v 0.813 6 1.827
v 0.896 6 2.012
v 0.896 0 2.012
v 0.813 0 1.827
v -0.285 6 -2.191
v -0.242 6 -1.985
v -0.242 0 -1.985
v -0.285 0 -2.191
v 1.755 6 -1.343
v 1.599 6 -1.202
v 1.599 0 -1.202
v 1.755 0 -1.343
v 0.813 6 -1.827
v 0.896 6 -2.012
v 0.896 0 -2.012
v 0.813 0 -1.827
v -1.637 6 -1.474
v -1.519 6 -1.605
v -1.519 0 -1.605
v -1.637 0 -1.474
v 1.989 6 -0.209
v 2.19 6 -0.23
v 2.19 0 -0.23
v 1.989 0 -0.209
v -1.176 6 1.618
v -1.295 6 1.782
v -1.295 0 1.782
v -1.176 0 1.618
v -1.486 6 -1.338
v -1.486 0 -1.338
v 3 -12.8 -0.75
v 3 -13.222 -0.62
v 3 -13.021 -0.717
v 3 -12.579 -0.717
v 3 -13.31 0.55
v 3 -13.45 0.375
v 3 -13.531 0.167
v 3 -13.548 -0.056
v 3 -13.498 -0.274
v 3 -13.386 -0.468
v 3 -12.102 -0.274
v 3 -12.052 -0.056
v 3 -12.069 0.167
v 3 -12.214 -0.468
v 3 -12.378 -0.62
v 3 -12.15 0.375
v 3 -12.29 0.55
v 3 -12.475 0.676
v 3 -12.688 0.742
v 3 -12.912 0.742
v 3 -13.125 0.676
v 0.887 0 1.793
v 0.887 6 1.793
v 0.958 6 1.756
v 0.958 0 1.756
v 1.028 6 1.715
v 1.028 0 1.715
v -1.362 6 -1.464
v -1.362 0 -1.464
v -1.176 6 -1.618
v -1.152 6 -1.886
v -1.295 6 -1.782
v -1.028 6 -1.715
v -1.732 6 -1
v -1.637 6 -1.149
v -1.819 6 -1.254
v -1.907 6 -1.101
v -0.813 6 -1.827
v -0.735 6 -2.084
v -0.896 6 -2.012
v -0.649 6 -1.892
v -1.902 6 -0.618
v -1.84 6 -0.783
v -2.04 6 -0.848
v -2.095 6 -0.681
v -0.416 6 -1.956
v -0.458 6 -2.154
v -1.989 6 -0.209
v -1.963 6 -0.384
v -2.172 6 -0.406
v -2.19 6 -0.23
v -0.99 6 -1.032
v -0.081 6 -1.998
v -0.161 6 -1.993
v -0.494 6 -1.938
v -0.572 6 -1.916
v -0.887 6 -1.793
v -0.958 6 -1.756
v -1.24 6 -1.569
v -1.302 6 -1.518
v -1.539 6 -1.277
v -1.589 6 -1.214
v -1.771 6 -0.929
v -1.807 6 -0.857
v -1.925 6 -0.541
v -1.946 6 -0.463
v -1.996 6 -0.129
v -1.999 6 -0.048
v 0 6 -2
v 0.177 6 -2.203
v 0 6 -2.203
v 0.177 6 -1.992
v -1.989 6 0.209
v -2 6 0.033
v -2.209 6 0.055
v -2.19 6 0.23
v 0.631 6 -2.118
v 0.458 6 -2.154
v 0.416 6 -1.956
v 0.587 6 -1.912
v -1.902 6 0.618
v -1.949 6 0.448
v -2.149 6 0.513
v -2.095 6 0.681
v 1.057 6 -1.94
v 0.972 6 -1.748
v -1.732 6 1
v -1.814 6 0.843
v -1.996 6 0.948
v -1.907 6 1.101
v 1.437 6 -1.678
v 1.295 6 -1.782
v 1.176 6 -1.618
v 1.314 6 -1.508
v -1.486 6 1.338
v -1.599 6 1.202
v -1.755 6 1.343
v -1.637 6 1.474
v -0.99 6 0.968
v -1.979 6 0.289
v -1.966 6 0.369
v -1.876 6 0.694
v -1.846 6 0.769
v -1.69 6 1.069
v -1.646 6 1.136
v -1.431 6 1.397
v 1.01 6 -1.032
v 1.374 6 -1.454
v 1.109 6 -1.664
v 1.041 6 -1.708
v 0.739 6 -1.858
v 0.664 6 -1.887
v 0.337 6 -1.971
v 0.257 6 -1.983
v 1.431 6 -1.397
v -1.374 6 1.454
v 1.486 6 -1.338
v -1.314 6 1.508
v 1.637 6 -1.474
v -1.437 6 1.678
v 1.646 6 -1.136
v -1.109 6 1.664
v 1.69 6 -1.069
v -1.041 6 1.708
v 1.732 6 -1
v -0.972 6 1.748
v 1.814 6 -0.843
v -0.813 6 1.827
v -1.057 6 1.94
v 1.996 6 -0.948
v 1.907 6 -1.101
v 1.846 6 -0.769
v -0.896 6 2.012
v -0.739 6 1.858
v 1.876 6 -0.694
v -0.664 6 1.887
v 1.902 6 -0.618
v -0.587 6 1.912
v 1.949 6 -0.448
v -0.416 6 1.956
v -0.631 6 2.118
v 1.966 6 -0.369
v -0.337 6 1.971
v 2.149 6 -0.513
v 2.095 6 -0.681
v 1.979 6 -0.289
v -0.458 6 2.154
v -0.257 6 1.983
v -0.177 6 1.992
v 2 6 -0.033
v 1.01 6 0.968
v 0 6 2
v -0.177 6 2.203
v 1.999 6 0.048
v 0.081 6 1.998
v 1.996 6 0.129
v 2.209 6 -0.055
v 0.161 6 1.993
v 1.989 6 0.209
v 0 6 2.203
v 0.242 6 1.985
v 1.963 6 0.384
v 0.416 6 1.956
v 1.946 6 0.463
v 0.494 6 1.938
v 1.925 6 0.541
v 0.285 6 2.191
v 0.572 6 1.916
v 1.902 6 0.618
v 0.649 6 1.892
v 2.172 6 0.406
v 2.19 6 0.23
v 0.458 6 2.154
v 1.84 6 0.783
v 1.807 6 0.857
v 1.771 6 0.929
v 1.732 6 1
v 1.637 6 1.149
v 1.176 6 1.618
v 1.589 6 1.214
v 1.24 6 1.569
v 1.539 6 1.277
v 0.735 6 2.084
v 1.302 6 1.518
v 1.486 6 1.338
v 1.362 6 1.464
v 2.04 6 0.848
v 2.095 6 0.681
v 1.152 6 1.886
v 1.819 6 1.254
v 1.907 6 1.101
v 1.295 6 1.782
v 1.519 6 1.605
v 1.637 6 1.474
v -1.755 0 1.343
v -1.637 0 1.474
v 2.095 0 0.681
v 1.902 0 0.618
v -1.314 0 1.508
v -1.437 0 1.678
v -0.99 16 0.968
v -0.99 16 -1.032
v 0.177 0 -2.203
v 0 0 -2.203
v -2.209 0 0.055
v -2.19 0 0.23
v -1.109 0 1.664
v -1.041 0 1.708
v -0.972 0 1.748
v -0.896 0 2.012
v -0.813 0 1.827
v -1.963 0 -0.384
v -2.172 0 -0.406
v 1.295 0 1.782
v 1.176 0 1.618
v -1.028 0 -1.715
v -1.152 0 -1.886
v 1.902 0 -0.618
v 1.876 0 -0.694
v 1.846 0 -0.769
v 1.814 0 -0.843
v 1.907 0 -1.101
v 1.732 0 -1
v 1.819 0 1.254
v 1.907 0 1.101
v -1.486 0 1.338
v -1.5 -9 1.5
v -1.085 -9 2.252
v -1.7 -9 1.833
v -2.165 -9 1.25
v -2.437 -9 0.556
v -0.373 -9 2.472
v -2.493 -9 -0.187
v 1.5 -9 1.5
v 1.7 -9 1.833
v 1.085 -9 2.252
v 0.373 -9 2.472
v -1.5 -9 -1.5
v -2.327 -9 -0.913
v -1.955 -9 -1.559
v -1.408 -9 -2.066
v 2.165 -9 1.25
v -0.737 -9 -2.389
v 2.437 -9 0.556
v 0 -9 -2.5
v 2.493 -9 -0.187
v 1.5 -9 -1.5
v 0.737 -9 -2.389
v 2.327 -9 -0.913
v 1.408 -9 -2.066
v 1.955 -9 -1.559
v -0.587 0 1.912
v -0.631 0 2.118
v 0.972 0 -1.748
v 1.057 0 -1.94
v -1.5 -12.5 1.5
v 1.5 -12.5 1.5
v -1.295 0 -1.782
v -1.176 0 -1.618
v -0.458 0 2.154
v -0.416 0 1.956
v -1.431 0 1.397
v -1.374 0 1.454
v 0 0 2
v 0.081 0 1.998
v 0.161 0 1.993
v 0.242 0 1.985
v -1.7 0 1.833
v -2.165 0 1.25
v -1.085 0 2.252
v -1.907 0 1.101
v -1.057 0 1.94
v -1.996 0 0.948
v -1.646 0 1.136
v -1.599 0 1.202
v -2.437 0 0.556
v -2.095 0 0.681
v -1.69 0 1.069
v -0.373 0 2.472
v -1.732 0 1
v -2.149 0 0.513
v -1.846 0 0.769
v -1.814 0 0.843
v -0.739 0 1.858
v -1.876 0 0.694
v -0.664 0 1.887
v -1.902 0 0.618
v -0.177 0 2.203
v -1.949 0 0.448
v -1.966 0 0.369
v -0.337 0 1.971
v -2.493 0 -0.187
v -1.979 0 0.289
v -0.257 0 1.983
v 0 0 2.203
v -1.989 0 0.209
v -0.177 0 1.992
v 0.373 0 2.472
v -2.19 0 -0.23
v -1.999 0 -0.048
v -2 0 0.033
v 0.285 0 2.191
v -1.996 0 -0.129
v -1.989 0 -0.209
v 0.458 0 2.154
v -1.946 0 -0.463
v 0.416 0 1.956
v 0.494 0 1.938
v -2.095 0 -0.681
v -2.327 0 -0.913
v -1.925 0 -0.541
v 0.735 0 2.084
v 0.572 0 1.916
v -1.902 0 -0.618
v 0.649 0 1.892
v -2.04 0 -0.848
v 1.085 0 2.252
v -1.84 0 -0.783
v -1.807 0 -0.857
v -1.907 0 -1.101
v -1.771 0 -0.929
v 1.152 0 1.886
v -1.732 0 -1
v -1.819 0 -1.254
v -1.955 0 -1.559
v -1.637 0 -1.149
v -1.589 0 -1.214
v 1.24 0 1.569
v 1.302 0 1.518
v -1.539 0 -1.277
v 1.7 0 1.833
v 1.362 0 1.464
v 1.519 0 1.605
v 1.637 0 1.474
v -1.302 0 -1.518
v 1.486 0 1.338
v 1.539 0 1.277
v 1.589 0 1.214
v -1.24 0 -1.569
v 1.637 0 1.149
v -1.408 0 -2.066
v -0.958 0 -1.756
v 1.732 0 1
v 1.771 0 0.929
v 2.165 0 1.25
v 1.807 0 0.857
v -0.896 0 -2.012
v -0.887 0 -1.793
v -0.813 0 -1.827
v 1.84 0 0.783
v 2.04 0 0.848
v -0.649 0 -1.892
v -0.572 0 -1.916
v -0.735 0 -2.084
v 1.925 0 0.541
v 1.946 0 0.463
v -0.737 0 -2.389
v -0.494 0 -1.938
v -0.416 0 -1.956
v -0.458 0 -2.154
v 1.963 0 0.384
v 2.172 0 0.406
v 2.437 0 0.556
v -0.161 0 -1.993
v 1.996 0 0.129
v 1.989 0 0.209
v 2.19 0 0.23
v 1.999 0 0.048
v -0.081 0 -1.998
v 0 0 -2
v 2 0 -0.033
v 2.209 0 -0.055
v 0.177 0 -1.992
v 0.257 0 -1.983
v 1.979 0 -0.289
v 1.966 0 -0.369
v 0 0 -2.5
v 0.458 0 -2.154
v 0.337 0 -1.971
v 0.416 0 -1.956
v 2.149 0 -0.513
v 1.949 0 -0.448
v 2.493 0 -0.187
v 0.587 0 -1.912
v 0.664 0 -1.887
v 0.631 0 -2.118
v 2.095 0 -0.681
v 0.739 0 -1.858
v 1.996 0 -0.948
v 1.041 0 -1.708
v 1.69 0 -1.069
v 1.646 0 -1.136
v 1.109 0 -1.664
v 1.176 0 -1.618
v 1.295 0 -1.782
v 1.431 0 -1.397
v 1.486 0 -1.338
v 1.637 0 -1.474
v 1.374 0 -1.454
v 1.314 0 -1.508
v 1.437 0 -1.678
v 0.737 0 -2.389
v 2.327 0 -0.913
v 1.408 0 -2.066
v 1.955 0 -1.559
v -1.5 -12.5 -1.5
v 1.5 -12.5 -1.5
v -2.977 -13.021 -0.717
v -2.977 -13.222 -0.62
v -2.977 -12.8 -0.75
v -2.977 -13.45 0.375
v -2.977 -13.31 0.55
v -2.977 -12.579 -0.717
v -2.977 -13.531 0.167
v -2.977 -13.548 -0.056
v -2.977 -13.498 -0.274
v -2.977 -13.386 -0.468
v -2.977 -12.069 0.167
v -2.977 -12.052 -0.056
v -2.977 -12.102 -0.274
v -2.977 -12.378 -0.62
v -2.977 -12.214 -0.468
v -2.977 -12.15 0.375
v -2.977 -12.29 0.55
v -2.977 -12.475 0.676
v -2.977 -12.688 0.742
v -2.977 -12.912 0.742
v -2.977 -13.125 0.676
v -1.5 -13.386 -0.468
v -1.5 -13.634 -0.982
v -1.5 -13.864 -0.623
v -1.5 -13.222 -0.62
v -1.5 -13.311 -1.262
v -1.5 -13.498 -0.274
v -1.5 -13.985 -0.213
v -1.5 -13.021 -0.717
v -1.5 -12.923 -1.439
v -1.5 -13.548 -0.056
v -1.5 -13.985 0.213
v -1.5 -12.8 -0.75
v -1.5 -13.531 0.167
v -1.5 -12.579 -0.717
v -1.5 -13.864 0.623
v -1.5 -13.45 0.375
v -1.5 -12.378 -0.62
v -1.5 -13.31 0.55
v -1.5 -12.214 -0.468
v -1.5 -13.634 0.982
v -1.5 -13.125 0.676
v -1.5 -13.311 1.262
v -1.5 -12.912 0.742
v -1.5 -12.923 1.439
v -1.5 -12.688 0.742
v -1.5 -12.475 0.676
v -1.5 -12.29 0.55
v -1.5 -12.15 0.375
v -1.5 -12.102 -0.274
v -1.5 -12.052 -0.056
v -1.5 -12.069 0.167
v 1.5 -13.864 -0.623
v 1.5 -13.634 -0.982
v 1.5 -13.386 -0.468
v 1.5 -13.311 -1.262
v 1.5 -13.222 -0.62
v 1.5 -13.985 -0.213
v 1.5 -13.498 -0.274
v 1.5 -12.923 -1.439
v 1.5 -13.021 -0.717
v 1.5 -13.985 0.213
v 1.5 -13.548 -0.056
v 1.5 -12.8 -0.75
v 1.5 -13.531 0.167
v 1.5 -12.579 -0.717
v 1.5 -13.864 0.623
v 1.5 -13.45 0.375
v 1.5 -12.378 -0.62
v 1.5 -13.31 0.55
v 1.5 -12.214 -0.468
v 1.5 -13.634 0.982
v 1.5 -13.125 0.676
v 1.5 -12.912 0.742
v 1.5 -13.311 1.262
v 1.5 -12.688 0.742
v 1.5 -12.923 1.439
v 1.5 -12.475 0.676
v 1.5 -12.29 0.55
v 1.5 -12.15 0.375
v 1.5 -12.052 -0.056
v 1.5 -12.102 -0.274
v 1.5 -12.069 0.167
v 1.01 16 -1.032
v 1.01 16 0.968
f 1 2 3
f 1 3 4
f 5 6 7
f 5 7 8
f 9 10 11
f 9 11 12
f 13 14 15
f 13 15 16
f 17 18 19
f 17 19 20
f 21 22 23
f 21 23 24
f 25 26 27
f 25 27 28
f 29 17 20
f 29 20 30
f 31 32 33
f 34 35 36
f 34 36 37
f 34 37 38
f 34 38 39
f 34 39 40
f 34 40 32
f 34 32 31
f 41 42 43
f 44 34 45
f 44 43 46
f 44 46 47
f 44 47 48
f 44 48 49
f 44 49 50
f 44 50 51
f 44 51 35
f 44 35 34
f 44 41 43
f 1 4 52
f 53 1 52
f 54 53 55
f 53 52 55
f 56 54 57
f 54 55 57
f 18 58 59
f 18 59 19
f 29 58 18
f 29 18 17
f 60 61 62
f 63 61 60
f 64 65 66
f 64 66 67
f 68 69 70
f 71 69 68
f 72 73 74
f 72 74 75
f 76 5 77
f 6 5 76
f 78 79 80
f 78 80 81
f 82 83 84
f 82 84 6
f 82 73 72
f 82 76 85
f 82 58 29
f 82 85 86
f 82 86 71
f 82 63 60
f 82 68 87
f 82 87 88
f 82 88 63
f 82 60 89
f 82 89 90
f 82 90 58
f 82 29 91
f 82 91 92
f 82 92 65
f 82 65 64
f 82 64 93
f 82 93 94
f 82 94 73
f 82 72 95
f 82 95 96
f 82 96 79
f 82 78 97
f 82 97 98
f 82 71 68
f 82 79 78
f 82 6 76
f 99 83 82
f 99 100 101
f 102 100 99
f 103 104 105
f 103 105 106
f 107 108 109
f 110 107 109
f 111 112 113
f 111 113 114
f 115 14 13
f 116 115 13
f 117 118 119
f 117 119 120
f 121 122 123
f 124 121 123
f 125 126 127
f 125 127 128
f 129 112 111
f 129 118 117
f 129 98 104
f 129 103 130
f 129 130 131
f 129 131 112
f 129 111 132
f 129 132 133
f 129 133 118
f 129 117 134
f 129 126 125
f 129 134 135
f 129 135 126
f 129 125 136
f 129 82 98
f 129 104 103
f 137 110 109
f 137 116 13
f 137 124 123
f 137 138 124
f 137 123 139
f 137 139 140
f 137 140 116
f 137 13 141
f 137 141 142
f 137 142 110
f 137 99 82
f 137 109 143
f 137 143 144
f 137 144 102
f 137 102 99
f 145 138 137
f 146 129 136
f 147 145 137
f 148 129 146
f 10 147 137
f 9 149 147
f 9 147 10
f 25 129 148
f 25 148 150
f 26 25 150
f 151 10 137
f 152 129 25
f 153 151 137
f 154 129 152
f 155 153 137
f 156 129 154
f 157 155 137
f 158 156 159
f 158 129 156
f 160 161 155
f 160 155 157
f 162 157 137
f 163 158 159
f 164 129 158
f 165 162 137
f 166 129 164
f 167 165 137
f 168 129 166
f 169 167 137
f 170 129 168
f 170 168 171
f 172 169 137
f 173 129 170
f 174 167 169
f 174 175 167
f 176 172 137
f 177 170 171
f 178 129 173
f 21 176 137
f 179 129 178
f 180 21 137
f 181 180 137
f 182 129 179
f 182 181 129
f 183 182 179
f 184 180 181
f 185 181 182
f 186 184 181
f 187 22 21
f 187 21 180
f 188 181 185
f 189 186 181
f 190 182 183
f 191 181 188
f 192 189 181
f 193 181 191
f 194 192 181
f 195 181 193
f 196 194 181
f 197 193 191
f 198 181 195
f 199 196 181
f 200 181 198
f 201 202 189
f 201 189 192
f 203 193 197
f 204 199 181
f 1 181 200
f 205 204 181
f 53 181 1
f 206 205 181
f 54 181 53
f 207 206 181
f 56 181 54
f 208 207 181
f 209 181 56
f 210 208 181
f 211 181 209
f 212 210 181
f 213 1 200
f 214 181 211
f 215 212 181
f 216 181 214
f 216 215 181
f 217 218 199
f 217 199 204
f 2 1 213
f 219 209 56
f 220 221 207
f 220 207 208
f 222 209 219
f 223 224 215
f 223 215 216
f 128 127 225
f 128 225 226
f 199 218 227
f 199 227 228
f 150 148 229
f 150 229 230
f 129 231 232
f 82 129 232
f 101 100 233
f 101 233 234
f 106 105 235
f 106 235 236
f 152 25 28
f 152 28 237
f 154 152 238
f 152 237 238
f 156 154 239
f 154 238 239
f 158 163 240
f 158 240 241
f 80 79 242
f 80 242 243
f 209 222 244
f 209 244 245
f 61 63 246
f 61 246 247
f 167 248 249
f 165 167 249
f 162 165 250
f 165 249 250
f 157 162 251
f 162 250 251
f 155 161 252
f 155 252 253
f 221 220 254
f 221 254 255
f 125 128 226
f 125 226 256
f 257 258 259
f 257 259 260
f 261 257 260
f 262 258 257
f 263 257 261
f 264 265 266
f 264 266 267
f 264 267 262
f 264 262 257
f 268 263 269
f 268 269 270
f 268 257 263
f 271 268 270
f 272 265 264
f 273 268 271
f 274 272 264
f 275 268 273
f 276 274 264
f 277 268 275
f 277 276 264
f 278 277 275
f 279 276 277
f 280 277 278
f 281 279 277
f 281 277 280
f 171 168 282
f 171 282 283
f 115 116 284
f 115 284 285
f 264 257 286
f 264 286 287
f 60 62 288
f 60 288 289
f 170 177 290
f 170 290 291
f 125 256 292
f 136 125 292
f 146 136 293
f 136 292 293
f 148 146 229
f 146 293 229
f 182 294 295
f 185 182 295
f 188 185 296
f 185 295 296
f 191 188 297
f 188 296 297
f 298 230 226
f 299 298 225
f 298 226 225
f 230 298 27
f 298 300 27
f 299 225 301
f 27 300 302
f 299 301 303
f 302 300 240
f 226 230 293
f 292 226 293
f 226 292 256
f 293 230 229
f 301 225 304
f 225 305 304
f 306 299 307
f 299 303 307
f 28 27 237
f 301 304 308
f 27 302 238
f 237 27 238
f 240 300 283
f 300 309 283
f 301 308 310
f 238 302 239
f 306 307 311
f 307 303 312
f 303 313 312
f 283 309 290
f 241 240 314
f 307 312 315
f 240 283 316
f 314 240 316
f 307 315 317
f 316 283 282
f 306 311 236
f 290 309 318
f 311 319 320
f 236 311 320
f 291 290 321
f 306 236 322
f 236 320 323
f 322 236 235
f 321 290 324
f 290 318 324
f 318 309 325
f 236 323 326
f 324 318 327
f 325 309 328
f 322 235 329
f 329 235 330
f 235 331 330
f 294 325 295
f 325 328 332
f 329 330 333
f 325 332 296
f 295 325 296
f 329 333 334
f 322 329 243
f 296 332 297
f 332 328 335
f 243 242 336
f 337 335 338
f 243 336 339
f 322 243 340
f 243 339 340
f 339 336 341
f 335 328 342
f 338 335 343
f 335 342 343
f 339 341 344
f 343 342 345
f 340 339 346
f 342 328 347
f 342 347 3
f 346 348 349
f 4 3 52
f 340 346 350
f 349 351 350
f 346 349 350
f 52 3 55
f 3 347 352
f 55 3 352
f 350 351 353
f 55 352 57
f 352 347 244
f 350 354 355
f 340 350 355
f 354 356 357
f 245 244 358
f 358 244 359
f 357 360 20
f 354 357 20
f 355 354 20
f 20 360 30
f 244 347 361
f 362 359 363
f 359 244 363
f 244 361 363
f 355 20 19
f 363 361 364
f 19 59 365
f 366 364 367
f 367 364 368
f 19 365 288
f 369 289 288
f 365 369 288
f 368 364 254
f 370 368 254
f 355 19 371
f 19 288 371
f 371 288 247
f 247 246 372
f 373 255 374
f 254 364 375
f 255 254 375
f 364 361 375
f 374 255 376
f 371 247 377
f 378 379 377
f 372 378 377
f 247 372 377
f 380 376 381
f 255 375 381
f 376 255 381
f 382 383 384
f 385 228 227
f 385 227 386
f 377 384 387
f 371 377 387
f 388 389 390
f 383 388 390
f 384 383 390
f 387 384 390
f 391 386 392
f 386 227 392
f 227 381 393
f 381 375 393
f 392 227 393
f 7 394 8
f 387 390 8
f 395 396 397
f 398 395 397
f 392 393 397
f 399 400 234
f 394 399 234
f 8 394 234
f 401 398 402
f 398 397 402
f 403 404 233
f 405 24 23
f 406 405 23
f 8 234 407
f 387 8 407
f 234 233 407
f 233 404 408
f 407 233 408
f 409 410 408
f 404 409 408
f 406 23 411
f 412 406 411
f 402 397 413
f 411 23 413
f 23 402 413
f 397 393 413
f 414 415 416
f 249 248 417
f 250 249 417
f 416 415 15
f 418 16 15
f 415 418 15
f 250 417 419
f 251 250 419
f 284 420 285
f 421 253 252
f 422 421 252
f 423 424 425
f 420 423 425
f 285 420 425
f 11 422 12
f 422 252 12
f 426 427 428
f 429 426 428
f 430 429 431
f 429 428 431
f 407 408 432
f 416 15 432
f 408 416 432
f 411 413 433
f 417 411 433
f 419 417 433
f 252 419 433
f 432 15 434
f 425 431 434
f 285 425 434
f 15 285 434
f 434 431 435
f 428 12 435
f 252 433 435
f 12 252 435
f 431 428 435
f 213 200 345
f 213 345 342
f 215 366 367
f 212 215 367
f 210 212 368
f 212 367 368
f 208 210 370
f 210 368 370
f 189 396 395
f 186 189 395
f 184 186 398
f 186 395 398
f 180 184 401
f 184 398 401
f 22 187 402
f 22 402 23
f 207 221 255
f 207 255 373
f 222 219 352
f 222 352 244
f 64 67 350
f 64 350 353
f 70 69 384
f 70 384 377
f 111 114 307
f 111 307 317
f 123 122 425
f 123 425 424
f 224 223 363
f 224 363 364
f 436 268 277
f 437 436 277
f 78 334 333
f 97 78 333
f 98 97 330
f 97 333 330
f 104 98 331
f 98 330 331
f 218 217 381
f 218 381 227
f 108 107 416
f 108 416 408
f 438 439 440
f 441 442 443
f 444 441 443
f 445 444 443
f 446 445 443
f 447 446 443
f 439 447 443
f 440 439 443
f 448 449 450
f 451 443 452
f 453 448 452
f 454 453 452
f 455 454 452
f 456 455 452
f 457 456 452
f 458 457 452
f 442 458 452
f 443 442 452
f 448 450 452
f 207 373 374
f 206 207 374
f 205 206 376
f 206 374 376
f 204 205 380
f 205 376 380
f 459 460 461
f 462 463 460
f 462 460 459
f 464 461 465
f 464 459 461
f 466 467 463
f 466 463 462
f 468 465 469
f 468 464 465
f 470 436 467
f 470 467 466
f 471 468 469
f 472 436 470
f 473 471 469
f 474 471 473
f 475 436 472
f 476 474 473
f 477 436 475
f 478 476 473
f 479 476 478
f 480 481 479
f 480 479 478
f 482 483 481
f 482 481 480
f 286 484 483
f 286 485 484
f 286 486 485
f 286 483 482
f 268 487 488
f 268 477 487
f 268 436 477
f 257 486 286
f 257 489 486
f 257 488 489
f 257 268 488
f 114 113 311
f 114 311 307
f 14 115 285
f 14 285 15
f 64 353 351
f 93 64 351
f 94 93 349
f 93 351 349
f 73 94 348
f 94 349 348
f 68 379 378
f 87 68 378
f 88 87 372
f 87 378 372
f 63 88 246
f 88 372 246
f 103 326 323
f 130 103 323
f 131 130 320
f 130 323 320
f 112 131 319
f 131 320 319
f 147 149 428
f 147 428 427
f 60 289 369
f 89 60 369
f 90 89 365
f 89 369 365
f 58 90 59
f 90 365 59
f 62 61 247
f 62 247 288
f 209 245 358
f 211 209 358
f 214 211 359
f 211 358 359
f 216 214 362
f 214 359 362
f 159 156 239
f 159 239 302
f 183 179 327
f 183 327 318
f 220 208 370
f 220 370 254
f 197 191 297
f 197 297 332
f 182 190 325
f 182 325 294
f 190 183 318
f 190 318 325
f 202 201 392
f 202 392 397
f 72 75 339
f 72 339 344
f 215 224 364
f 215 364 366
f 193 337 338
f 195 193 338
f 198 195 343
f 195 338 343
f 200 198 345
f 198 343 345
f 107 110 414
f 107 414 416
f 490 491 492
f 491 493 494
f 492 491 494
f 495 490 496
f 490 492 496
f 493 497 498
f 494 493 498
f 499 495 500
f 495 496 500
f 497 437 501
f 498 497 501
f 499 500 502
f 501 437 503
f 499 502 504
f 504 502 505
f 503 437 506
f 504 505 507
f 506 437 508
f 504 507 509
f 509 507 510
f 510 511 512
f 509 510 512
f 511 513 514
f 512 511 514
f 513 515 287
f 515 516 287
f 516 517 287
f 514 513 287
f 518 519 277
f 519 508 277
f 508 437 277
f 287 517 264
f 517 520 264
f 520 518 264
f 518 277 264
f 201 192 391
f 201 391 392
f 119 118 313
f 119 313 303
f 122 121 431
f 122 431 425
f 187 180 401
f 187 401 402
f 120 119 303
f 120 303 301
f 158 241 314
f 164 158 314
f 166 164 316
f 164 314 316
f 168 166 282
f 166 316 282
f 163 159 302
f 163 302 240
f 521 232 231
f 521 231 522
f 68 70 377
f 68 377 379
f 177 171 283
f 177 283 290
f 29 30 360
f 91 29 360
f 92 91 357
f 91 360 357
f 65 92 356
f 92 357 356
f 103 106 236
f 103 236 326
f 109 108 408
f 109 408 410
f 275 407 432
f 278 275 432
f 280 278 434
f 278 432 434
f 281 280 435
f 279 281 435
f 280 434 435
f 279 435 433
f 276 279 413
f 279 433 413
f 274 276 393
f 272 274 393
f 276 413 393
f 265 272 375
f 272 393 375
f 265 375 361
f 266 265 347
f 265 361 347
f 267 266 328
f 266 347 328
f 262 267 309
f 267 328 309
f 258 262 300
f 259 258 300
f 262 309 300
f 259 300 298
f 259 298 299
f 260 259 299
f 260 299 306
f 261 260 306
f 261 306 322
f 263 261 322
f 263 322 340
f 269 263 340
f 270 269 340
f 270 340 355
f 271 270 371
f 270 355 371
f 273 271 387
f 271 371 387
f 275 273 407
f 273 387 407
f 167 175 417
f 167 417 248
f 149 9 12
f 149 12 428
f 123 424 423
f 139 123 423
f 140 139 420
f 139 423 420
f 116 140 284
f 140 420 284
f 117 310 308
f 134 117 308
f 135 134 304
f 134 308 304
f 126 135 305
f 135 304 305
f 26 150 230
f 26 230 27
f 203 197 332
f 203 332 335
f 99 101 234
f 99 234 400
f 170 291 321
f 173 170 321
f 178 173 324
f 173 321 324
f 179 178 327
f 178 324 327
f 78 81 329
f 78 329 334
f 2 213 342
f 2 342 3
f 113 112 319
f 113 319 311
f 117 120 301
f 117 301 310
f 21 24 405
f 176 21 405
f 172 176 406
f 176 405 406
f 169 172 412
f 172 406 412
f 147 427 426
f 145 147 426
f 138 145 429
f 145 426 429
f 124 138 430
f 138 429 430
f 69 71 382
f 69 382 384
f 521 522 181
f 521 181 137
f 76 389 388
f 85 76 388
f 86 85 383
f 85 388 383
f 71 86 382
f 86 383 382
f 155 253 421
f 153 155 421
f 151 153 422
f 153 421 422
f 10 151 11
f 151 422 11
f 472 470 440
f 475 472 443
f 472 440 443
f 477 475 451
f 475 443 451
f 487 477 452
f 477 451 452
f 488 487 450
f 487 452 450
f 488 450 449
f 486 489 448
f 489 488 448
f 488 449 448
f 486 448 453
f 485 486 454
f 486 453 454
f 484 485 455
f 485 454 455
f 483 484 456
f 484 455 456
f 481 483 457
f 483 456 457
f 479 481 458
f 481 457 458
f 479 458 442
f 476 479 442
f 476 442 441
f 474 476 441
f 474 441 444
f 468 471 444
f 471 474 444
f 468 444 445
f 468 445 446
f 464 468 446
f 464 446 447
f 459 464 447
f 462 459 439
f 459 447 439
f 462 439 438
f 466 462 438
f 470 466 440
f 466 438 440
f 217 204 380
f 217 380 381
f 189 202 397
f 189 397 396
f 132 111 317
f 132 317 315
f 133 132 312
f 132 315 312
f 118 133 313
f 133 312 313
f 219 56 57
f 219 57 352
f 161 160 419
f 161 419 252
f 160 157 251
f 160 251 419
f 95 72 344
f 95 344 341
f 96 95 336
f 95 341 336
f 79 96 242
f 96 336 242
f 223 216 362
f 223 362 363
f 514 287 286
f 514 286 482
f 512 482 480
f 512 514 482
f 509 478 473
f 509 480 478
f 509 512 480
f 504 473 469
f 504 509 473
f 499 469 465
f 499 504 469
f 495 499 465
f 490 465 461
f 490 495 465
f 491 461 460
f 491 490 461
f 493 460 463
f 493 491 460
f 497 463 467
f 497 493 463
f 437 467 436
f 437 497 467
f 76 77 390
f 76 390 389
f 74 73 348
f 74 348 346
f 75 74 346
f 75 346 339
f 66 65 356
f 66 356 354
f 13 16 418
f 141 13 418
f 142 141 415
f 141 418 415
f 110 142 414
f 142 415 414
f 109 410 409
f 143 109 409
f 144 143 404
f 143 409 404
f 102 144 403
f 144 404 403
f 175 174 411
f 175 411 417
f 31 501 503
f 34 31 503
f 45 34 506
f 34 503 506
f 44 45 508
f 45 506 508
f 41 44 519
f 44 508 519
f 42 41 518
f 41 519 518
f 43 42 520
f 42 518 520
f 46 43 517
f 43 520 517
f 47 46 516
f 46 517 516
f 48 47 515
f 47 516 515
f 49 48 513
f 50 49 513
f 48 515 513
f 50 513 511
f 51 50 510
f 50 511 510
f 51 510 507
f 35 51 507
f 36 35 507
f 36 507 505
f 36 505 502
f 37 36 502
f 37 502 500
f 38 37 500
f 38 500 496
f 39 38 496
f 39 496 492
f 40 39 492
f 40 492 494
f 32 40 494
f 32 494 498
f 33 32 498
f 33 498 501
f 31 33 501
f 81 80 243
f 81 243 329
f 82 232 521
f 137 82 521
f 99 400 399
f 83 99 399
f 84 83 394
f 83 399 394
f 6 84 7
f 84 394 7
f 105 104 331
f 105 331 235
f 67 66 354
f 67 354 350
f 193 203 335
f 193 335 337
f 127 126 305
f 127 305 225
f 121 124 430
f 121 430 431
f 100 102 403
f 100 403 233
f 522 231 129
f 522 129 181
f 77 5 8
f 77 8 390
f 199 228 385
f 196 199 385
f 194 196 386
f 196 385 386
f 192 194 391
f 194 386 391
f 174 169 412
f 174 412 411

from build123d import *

# Parameters (mm, degrees)
SKETCH1_R                = 2
BOSS_EXTRUDE1_DEPTH      = 6
BOSS_EXTRUDE3_DEPTH      = 6
CIRPATTERN1_COUNT        = 30
SKETCH9_R                = 2.5
BOSS_EXTRUDE5_DEPTH      = 9
SKETCH10_W               = 2
SKETCH10_H               = 2
BOSS_EXTRUDE6_DEPTH      = 10
SKETCH11_W               = 3
SKETCH11_H               = 3
BOSS_EXTRUDE7_DEPTH      = 5
FILLET1_RADIUS           = 1.5
FILLET1_LENGTH           = 3
BOSS_EXTRUDE9_DEPTH      = 1.5
BOSS_EXTRUDE9_DEPTH_BACK = 4.477112072
SKETCH12_R               = 0.75


with BuildPart() as part:
    # Sketch1 → Boss-Extrude1 (new body)
    with BuildSketch(Plane(origin=(0, 0, 0), x_dir=(1, 0, 0), z_dir=(0, 1, 0))):
        with Locations(Location((0, 0, 0), (0, 0, 270))):
            Circle(SKETCH1_R)
    extrude(amount=BOSS_EXTRUDE1_DEPTH)

    # Sketch5 → Boss-Extrude3 (add)
    with BuildSketch(Plane(origin=(0, 6, 0), x_dir=(1, 0, 0), z_dir=(0, 1, 0))):
        Polygon((0, -2), (-0.176506233, -1.992196162), (-0.176506233, -2.202534122), (0, -2.202534122), align=None)
    boss_extrude3 = extrude(amount=-BOSS_EXTRUDE3_DEPTH)

    # CirPattern1: Boss-Extrude3 ×30 about axis
    cirpattern1_axis = Axis((0, 0, 0), (0, 1, 0))
    for i in range(1, CIRPATTERN1_COUNT):
        add(boss_extrude3.rotate(cirpattern1_axis, i * 360 / CIRPATTERN1_COUNT))

    # Sketch9 → Boss-Extrude5 (add)
    with BuildSketch(Plane.XZ):
        with Locations(Location((0, 0, 0), (0, 0, 270))):
            Circle(SKETCH9_R)
    extrude(amount=BOSS_EXTRUDE5_DEPTH)

    # Sketch10 → Boss-Extrude6 (add)
    with BuildSketch(Plane(origin=(0, 6, 0), x_dir=(1, 0, 0), z_dir=(0, 1, 0))):
        with Locations((0.009702593, 0.031661031)):
            Rectangle(SKETCH10_W, SKETCH10_H)
    extrude(amount=BOSS_EXTRUDE6_DEPTH)

    # Sketch11 → Boss-Extrude7 (add)
    with BuildSketch(Plane.XZ.offset(9)):
        Rectangle(SKETCH11_W, SKETCH11_H)
    extrude(amount=BOSS_EXTRUDE7_DEPTH)

    # Fillet1: full round fillet: the end face becomes a half cylinder, R = half its width
    fillet1_face = Plane((0, -14, 0), x_dir=(1, 0, 0), z_dir=(0, -1, 0))  # on the end face: x along it, z out of the body
    fillet1_slab = fillet1_face.offset(-FILLET1_RADIUS / 2) * Box(FILLET1_LENGTH, 2 * FILLET1_RADIUS, FILLET1_RADIUS, mode=Mode.PRIVATE)  # the body's end, R deep
    fillet1_round = Plane((0, -12.5, 0), x_dir=(0, -1, 0), z_dir=(1, 0, 0)) * Cylinder(FILLET1_RADIUS, FILLET1_LENGTH, mode=Mode.PRIVATE)  # its axis R under the face
    add(fillet1_slab - fillet1_round, mode=Mode.SUBTRACT)

    # Sketch12 → Boss-Extrude9 (add, two sides: drawn at the far end of the back side and taken through both)
    with BuildSketch(Plane(origin=(1.5, 0, 0), x_dir=(0, 0, -1), z_dir=(1, 0, 0)).offset(-BOSS_EXTRUDE9_DEPTH_BACK)):
        with Locations((0, -12.8)):
            Circle(SKETCH12_R)
    extrude(amount=BOSS_EXTRUDE9_DEPTH + BOSS_EXTRUDE9_DEPTH_BACK)


solid = part.part
